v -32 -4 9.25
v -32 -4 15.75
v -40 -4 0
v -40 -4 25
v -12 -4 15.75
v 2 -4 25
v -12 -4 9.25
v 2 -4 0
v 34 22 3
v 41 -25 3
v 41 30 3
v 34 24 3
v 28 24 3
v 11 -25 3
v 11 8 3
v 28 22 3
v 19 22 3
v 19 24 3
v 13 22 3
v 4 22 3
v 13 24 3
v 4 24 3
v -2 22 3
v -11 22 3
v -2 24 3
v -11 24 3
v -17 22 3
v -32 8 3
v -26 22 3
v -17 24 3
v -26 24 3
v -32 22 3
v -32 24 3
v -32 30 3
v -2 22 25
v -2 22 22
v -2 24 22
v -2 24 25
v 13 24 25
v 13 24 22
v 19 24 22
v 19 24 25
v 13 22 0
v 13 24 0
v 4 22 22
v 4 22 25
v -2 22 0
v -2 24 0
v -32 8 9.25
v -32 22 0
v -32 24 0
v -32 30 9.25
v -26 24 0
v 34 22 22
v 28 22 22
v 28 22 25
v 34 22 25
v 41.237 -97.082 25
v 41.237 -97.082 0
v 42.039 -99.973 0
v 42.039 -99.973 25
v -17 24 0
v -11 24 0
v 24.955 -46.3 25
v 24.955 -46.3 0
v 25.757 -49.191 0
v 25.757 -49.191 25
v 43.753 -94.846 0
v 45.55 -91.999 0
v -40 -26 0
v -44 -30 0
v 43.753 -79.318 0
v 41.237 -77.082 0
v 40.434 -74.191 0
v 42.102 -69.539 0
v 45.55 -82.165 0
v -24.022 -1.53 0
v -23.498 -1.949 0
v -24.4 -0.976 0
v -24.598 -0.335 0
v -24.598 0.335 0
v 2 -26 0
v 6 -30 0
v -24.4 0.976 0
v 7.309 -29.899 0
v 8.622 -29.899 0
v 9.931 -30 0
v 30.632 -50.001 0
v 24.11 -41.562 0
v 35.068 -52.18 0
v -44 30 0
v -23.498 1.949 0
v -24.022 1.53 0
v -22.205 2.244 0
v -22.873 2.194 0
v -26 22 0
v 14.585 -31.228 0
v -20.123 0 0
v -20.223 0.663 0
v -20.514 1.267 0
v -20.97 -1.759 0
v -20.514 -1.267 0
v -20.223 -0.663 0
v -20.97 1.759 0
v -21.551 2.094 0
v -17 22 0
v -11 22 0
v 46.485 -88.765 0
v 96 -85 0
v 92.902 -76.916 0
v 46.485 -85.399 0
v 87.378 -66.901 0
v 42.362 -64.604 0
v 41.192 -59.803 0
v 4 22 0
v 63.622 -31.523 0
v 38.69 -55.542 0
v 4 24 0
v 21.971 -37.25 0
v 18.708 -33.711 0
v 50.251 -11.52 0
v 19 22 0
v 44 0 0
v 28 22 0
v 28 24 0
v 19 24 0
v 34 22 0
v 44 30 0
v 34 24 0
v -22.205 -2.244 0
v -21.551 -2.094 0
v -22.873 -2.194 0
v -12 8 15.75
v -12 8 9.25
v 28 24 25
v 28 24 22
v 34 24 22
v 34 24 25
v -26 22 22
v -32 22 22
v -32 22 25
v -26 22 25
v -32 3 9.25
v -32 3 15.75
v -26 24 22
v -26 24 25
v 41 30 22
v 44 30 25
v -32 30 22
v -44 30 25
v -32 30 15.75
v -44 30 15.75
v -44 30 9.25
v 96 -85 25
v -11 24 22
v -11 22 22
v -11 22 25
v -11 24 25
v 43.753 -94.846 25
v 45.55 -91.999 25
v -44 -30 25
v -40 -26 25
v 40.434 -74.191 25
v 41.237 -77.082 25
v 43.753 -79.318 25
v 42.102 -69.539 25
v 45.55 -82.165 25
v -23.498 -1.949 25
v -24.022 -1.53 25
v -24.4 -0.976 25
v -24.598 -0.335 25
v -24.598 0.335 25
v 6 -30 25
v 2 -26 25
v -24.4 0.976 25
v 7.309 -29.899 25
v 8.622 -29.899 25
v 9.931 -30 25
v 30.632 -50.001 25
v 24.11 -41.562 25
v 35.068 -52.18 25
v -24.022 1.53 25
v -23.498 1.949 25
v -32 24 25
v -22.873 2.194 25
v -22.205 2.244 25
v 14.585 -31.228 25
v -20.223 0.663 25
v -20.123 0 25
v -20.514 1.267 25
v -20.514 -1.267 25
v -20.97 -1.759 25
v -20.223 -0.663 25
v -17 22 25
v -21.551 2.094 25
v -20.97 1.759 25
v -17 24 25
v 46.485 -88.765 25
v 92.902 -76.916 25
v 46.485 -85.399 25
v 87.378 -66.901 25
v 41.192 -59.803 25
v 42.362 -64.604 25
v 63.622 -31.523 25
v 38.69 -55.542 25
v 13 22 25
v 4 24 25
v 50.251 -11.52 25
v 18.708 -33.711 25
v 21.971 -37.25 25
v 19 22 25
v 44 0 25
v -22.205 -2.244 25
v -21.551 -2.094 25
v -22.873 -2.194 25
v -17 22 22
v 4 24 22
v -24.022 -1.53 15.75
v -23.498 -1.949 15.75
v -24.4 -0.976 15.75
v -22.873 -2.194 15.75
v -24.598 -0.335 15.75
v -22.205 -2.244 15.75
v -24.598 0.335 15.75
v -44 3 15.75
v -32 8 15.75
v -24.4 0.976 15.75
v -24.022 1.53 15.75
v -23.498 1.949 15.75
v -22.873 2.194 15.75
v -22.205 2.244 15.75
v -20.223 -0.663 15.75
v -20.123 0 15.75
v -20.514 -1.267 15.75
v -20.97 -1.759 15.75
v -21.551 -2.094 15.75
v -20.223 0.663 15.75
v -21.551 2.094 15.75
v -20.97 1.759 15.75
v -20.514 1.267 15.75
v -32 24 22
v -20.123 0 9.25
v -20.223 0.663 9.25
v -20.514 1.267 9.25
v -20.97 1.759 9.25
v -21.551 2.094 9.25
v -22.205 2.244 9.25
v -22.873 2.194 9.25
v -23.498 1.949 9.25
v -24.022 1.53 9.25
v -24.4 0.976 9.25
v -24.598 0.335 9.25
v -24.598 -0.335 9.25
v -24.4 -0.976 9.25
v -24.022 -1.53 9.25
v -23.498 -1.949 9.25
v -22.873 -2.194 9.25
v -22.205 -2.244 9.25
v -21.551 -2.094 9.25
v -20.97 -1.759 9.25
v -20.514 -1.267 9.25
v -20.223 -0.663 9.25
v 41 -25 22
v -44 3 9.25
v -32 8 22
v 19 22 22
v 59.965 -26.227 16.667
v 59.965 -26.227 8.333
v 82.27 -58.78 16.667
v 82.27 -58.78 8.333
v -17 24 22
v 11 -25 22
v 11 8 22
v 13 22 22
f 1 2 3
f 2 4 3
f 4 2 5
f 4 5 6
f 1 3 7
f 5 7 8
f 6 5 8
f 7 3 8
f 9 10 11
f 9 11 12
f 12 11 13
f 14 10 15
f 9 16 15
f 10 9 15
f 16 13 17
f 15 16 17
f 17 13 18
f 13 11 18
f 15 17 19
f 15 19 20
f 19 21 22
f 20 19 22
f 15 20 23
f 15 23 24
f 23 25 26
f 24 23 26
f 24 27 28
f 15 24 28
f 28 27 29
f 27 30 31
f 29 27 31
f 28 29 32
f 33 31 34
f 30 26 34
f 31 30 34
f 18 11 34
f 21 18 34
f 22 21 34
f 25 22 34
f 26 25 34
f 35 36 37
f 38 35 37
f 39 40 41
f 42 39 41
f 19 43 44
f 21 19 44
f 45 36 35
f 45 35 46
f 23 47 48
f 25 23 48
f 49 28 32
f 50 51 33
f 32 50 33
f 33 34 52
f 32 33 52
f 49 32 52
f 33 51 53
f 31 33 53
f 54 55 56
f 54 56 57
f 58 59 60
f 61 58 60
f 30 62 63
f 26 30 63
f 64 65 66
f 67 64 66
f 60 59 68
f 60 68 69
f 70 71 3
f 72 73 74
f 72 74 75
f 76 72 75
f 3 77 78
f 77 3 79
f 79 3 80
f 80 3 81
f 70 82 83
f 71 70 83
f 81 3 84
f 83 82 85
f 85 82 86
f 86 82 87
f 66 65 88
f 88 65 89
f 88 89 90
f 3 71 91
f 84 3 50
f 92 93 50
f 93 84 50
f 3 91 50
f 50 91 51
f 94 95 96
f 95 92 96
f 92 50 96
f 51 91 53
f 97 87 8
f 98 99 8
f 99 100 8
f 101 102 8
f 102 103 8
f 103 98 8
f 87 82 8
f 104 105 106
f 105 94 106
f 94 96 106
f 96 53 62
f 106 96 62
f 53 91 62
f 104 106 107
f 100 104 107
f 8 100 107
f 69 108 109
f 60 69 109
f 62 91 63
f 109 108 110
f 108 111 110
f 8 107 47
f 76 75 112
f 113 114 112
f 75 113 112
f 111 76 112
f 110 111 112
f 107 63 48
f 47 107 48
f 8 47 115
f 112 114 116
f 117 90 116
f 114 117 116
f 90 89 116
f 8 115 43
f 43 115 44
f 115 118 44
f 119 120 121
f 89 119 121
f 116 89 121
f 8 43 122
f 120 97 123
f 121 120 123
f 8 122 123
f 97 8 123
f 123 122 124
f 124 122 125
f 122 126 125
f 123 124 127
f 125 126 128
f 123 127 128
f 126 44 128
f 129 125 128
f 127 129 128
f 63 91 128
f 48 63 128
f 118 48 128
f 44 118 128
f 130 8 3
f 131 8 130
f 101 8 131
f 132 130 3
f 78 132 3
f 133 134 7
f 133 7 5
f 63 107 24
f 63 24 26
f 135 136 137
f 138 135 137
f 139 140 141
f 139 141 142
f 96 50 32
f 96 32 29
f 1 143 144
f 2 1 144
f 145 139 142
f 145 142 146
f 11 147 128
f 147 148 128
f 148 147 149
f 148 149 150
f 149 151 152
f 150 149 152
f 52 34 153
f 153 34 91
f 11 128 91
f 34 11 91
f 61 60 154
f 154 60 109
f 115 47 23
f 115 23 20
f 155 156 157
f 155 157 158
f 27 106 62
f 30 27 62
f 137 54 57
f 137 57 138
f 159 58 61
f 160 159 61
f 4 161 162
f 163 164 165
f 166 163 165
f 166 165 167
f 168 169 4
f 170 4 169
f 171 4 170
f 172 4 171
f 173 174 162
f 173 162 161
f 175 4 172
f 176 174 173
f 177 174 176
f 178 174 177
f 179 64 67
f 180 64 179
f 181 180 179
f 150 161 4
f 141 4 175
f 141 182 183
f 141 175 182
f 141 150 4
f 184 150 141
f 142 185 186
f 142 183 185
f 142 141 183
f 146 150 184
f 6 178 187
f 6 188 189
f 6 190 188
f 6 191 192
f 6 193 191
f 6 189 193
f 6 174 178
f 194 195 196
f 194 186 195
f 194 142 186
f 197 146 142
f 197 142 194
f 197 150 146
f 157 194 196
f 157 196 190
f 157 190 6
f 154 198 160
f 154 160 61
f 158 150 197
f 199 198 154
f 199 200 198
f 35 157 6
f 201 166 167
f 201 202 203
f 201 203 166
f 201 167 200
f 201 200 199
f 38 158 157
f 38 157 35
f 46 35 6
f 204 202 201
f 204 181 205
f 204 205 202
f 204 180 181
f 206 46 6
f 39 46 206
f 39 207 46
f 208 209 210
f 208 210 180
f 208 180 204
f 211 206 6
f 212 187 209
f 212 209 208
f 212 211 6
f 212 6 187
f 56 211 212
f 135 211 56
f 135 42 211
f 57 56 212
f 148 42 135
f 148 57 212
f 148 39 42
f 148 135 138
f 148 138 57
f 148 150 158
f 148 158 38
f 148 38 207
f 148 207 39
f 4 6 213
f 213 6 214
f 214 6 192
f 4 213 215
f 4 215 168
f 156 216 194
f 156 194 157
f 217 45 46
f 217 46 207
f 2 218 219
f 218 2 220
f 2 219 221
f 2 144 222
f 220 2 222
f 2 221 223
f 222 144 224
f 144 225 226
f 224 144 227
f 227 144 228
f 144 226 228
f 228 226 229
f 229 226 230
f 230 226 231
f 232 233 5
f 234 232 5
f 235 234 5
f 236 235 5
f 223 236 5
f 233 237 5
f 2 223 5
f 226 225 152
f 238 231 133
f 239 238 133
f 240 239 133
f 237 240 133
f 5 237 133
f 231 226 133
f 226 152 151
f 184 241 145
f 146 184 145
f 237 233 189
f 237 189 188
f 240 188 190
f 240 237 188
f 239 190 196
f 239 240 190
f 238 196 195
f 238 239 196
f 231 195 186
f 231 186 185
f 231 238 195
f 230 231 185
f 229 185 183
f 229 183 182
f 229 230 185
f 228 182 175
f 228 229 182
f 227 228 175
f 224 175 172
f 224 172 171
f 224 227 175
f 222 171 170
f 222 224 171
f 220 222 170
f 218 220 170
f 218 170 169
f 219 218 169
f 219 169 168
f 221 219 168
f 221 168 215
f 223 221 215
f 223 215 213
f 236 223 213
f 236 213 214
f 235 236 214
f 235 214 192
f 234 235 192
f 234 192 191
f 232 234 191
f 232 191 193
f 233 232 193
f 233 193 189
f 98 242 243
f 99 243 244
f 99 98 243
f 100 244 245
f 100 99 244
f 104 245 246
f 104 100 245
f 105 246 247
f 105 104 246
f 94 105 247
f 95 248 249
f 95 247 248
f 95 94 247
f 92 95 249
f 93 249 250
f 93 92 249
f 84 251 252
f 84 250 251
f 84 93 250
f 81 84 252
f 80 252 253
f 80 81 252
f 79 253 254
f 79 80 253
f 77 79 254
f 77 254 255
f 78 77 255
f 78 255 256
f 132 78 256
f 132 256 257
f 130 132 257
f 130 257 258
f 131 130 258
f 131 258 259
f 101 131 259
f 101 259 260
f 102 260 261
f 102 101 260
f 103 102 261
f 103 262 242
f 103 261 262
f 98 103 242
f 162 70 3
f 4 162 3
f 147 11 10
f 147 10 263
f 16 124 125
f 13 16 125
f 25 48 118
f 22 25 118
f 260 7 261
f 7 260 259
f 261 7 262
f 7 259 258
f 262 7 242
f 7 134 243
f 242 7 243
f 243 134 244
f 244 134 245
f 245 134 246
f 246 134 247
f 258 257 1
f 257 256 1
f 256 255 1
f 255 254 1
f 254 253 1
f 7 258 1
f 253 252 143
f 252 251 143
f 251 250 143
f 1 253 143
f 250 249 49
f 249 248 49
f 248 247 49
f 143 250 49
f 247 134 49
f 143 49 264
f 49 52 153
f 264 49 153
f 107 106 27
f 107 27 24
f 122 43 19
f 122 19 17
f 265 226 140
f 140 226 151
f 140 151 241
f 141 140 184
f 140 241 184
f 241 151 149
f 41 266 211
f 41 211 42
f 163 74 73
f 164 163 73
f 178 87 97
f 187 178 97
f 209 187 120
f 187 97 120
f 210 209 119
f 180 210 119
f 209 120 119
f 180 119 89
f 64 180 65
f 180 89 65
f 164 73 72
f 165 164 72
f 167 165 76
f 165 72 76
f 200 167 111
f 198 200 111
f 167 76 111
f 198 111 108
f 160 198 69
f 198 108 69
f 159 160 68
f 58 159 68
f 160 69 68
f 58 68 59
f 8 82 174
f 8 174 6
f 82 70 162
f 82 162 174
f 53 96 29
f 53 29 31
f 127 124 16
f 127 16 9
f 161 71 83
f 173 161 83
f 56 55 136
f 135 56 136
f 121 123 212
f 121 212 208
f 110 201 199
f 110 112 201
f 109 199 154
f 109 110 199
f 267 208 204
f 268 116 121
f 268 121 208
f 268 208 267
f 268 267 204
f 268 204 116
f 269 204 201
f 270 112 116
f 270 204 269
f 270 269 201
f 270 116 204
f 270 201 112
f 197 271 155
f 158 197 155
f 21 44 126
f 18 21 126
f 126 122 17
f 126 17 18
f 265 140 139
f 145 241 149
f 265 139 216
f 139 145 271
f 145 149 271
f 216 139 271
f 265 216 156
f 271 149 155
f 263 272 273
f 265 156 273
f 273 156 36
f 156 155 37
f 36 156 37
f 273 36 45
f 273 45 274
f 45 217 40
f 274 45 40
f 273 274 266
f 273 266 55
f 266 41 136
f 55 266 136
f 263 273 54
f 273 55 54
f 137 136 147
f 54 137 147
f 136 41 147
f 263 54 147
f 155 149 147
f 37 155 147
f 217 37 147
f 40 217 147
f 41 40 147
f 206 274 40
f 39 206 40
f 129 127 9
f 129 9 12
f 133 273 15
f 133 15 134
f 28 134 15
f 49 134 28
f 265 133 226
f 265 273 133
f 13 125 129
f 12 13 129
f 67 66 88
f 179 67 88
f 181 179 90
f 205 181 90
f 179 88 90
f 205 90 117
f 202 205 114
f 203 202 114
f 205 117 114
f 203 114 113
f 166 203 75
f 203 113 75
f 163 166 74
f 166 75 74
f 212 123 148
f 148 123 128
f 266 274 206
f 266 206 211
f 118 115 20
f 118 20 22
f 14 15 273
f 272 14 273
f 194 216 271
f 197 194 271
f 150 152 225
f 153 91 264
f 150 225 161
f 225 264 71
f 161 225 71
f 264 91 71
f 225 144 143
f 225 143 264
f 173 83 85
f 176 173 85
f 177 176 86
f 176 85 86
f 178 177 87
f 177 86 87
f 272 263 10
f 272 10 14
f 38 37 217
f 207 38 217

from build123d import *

# Parameters (mm, degrees)
F0_W     = 42
F0_H     = 22
F0_R     = 2.25
F0_W_2   = 6
F0_H_2   = 2
F1_DEPTH = 25
F2_W     = 12
F2_H     = 6.5
F2_W_2   = 20
F2_W_3   = 30
F2_H_2   = 19
F3_DEPTH = 22
F4_DEPTH = 55
F5_DEPTH = 34
F6_DEPTH = 27


with BuildPart() as f1:
    # F0 (on Top) → F1 (new body)
    with BuildSketch(Plane.XY):
        with BuildLine():
            Line((44, 30), (-44, 30))
            Line((-44, 30), (-44, -30))
            Line((-44, -30), (6, -30))
            ThreePointArc((6, -30), (7.965431, -29.886003), (9.930862, -30))
            Line((9.930862, -30), (44, -30))
            Line((44, -30), (44, 0))
            Line((44, 0), (44, 30))
        make_face()
        with Locations((-19, -15)):
            Rectangle(F0_W, F0_H, mode=Mode.SUBTRACT)
        with Locations((-22.372717, 0)):
            Circle(F0_R, mode=Mode.SUBTRACT)
        with Locations((-29, 23)):
            Rectangle(F0_W_2, F0_H_2, mode=Mode.SUBTRACT)
        with Locations((-14, 23)):
            Rectangle(F0_W_2, F0_H_2, mode=Mode.SUBTRACT)
        with Locations((1, 23)):
            Rectangle(F0_W_2, F0_H_2, mode=Mode.SUBTRACT)
        with Locations((16, 23)):
            Rectangle(F0_W_2, F0_H_2, mode=Mode.SUBTRACT)
        with Locations((31, 23)):
            Rectangle(F0_W_2, F0_H_2, mode=Mode.SUBTRACT)
        with BuildLine():
            add(Edge.make_bspline(
                [(44, 0), (51.823881, -18.846294), (91.528348, -66.164455), (96, -85)],
                knots=[0, 0, 0, 0, 99.644368, 99.644368, 99.644368, 99.644368], degree=3))
            Line((44, 0), (44, -30))
            Line((44, -30), (9.930862, -30))
            ThreePointArc((9.930862, -30), (20.465431, -35.364284), (24.955334, -46.300163))
            Line((24.955334, -46.300163), (25.757433, -49.190948))
            ThreePointArc((25.757433, -49.190948), (40.09637, -57.581132), (40.434485, -74.190948))
            Line((40.434485, -74.190948), (41.236584, -77.081733))
            ThreePointArc((41.236584, -77.081733), (46.603334, -87.081733), (41.236584, -97.081733))
            Line((41.236584, -97.081733), (42.038683, -99.972518))
            Line((42.038683, -99.972518), (96, -85))
        make_face()
    extrude(amount=F1_DEPTH)

    # F2 (on face) → F3 (cut)
    with BuildSketch(Plane(origin=(0, 30, 0), x_dir=(-1, 0, 0), z_dir=(0, 1, 0))):
        with Locations((38, 12.5)):
            Rectangle(F2_W, F2_H)
        with Locations((22, 12.5)):
            Rectangle(F2_W_2, F2_H)
        Polygon((32, 22), (-11, 22), (-11, 3), (32, 3), (32, 9.25), (12, 9.25), (12, 15.75), (32, 15.75), align=None)
        with Locations((-26, 12.5)):
            Rectangle(F2_W_3, F2_H_2)
    extrude(amount=-F3_DEPTH, mode=Mode.SUBTRACT)

    # F2 (on face) → F4 (cut)
    with BuildSketch(Plane(origin=(0, 30, 0), x_dir=(-1, 0, 0), z_dir=(0, 1, 0))):
        with Locations((-26, 12.5)):
            Rectangle(F2_W_3, F2_H_2)
    extrude(amount=-F4_DEPTH, mode=Mode.SUBTRACT)

    # F2 (on face) → F5 (cut, through all)
    with BuildSketch(Plane(origin=(0, 30, 0), x_dir=(-1, 0, 0), z_dir=(0, 1, 0))):
        with Locations((22, 12.5)):
            Rectangle(F2_W_2, F2_H)
    extrude(amount=-F5_DEPTH, mode=Mode.SUBTRACT)

    # F2 (on face) → F6 (cut)
    with BuildSketch(Plane(origin=(0, 30, 0), x_dir=(-1, 0, 0), z_dir=(0, 1, 0))):
        with Locations((38, 12.5)):
            Rectangle(F2_W, F2_H)
    extrude(amount=-F6_DEPTH, mode=Mode.SUBTRACT)


solid = f1.part
